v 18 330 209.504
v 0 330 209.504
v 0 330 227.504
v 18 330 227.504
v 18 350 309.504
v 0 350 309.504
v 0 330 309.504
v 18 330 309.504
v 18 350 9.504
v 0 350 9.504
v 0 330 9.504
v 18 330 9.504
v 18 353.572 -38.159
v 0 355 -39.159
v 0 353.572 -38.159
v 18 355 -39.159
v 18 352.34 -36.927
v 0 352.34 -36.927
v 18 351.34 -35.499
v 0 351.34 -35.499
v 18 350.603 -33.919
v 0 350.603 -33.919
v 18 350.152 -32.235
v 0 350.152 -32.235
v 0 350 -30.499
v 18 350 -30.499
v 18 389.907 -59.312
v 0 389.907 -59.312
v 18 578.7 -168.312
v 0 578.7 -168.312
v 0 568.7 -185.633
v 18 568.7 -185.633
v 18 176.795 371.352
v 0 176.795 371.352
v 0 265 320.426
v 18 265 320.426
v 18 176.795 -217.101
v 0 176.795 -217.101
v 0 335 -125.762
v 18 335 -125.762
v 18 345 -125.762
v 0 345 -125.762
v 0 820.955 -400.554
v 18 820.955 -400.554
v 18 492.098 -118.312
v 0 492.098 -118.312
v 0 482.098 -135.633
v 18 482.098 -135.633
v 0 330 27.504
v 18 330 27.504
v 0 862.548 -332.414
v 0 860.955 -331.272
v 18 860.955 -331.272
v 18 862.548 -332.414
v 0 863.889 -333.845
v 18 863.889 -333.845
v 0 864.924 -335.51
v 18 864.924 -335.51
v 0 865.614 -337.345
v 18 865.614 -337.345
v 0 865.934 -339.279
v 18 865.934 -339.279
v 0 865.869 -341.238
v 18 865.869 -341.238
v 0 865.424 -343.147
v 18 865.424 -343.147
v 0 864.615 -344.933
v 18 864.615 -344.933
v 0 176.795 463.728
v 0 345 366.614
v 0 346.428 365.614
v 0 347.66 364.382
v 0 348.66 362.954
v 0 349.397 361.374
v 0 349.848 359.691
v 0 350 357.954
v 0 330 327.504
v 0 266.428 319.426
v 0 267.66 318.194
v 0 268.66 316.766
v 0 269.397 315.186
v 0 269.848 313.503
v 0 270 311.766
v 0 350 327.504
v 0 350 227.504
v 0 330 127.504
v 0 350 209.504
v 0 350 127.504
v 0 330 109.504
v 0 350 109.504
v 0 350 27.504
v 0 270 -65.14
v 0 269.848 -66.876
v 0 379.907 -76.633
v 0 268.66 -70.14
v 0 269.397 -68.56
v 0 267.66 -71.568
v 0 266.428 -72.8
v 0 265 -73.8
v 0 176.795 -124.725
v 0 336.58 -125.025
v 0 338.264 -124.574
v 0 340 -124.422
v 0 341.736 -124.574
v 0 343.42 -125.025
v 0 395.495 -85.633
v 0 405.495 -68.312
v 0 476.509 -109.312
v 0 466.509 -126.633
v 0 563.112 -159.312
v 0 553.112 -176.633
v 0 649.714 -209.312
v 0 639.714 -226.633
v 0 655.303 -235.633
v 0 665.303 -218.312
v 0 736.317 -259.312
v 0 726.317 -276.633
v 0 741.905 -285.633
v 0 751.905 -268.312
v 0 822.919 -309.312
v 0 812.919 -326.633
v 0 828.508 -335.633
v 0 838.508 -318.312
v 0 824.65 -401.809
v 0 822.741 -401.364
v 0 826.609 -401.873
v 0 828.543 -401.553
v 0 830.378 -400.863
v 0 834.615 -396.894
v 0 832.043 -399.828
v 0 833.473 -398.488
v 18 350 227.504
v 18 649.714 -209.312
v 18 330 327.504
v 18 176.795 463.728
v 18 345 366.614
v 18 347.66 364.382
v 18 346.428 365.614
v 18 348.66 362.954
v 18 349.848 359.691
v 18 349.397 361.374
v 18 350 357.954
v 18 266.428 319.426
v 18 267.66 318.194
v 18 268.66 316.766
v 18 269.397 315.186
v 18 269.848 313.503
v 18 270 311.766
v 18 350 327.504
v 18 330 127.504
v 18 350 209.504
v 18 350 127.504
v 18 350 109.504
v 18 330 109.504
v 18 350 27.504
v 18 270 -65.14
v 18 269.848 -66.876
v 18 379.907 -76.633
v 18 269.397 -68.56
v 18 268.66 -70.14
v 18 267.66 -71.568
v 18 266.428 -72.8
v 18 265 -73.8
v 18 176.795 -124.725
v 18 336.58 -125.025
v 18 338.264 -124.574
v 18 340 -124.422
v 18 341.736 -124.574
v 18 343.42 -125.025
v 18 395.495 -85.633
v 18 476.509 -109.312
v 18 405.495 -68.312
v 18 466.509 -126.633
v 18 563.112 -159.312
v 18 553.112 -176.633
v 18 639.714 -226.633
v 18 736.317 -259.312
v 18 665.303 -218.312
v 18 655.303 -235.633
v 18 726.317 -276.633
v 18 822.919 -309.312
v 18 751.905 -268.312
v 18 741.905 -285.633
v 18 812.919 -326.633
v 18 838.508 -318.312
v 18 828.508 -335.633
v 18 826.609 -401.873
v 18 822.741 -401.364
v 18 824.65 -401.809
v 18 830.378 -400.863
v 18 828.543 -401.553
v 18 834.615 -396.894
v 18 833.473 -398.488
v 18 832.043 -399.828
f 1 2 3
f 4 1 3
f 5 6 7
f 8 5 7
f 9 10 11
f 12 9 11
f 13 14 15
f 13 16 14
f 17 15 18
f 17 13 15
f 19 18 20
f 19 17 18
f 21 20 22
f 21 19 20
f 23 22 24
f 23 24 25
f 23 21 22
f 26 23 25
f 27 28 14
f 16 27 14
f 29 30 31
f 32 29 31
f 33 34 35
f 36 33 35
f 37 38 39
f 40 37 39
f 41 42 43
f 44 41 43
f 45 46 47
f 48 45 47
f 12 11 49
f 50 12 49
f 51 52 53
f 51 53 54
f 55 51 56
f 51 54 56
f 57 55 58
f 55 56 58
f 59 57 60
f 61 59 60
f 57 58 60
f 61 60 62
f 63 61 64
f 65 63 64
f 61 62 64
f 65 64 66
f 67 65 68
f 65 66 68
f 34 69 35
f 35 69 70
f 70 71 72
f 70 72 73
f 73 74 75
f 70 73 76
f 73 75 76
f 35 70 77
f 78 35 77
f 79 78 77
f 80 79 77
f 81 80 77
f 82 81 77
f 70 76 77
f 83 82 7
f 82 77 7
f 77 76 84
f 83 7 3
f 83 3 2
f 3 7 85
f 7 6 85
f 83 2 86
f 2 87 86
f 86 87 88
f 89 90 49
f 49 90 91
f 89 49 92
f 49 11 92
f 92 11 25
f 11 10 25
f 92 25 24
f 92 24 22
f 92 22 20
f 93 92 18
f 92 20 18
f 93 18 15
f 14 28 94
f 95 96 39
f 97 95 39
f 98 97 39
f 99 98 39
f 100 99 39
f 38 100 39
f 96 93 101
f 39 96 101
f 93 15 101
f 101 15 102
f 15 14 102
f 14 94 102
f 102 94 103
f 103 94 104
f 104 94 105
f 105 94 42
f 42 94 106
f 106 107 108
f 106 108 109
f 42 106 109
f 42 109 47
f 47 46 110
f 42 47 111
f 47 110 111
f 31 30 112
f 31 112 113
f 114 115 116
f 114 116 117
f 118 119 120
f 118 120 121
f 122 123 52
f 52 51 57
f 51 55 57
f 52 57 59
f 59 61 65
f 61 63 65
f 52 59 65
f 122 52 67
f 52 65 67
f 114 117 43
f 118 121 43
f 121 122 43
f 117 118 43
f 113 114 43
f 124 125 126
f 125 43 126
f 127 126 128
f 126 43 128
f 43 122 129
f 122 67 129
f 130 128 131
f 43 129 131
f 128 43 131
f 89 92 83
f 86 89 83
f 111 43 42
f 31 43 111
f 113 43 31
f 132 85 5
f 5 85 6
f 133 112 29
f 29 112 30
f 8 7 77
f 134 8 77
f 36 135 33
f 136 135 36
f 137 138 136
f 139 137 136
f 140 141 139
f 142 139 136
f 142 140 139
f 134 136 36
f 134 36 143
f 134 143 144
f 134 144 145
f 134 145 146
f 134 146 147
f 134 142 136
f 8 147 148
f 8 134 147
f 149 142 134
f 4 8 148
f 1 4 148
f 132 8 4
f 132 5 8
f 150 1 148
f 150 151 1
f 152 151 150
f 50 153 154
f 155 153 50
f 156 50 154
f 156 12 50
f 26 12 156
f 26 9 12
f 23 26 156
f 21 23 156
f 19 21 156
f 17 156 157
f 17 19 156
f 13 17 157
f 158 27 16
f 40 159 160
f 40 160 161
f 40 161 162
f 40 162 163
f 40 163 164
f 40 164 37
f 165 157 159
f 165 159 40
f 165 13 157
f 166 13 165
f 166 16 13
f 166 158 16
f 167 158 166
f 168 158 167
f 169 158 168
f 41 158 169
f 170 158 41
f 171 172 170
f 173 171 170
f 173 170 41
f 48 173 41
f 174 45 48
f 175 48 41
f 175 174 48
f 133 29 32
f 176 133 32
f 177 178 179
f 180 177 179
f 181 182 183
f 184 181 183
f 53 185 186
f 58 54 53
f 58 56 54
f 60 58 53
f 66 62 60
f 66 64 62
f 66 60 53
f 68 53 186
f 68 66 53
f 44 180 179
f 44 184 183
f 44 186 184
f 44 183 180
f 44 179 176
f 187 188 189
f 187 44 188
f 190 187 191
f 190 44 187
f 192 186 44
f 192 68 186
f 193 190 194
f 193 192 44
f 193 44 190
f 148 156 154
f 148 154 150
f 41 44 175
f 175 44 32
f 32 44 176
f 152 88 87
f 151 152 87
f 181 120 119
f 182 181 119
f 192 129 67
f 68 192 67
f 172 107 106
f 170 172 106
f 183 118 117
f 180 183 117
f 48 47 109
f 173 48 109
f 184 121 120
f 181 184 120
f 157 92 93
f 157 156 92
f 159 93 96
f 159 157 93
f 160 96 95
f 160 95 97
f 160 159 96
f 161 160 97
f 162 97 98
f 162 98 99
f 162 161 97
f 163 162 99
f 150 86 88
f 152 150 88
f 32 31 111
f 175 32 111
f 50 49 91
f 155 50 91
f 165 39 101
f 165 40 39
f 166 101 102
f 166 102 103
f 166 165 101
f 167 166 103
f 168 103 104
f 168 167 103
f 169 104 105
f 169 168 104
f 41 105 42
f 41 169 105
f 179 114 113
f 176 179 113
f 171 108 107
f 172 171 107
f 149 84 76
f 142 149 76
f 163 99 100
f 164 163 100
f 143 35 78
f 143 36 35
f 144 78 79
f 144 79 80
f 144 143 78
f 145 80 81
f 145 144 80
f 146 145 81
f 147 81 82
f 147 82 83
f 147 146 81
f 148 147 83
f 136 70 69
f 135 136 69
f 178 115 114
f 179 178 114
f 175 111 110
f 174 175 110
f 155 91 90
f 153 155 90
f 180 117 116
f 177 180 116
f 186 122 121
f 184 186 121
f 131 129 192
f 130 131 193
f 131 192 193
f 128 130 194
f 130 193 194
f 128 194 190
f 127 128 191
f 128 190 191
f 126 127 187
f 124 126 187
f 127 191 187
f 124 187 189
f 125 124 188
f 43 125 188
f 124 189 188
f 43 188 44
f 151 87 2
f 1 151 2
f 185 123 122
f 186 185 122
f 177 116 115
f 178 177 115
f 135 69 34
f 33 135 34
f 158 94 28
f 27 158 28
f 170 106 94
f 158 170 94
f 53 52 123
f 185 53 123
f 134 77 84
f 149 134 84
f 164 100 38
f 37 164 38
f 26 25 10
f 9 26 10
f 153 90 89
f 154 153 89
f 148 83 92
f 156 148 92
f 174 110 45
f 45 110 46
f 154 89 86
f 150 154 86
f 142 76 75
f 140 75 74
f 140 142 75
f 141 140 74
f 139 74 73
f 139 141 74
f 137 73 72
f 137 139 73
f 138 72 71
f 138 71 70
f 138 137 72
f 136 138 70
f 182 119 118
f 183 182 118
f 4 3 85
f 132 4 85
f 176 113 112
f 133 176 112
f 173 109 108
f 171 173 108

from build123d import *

# Parameters (mm, degrees)
ESTRUSIONE_ESTRUSIONE1_DEPTH = 18
RACCORDO1_R                  = 10
RACCORDO2_R                  = 10


with BuildPart() as part:
    # Schizzo1 → Estrusione-Estrusione1 (new body)
    with BuildSketch(Plane(origin=(0, 0, 0), x_dir=(0, 0, -1), z_dir=(1, 0, 0))):
        Polygon((-109.503770047, 350), (-109.503770047, 330), (-127.503770047, 330), (-127.503770047, 350), (-209.503770047, 350), (-209.503770047, 330), (-227.503770047, 330), (-227.503770047, 350), (-309.503770047, 350), (-309.503770047, 330), (-327.503770047, 330), (-327.503770047, 350), (-363.727557783, 350), (-463.727557783, 176.794919243), (-371.351514713, 176.794919243), (-317.539536248, 270), (70.913458368, 270), (124.725436833, 176.794919243), (217.101479903, 176.794919243), (122.874982595, 340), (405.554474519, 829.615242271), (336.272442217, 869.615242271), (318.31248319, 838.507680735), (335.632991266, 828.507680735), (326.632991266, 812.919223467), (309.31248319, 822.919223467), (268.31248319, 751.905140356), (285.632991266, 741.905140356), (276.632991266, 726.316683088), (259.31248319, 736.316683088), (218.31248319, 665.302599978), (235.632991266, 655.302599978), (226.632991266, 639.71414271), (209.31248319, 649.71414271), (168.31248319, 578.7000596), (185.632991266, 568.7000596), (176.632991266, 553.111602331), (159.31248319, 563.111602331), (118.31248319, 492.097519221), (135.632991266, 482.097519221), (126.632991266, 466.509061953), (109.31248319, 476.509061953), (68.31248319, 405.494978843), (85.632991266, 395.494978843), (76.632991266, 379.906521574), (59.31248319, 389.906521574), (36.272442217, 350), (-9.503770047, 350), (-9.503770047, 330), (-27.503770047, 330), (-27.503770047, 350), align=None)
    extrude(amount=ESTRUSIONE_ESTRUSIONE1_DEPTH)

    # Raccordo1
    raccordo1_edges = [part.edges().sort_by_distance(p)[0] for p in [
        (9, 350, -36.272442217),
    ]]
    fillet(raccordo1_edges, radius=RACCORDO1_R)

    # Raccordo2
    raccordo2_edges = [part.edges().sort_by_distance(p)[0] for p in [
        (9, 869.615242271, -336.272442217),
        (9, 829.615242271, -405.554474519),
        (9, 340, -122.874982595),
        (9, 270, -70.913458368),
        (9, 270, 317.539536248),
        (9, 350, 363.727557783),
    ]]
    fillet(raccordo2_edges, radius=RACCORDO2_R)


solid = part.part
